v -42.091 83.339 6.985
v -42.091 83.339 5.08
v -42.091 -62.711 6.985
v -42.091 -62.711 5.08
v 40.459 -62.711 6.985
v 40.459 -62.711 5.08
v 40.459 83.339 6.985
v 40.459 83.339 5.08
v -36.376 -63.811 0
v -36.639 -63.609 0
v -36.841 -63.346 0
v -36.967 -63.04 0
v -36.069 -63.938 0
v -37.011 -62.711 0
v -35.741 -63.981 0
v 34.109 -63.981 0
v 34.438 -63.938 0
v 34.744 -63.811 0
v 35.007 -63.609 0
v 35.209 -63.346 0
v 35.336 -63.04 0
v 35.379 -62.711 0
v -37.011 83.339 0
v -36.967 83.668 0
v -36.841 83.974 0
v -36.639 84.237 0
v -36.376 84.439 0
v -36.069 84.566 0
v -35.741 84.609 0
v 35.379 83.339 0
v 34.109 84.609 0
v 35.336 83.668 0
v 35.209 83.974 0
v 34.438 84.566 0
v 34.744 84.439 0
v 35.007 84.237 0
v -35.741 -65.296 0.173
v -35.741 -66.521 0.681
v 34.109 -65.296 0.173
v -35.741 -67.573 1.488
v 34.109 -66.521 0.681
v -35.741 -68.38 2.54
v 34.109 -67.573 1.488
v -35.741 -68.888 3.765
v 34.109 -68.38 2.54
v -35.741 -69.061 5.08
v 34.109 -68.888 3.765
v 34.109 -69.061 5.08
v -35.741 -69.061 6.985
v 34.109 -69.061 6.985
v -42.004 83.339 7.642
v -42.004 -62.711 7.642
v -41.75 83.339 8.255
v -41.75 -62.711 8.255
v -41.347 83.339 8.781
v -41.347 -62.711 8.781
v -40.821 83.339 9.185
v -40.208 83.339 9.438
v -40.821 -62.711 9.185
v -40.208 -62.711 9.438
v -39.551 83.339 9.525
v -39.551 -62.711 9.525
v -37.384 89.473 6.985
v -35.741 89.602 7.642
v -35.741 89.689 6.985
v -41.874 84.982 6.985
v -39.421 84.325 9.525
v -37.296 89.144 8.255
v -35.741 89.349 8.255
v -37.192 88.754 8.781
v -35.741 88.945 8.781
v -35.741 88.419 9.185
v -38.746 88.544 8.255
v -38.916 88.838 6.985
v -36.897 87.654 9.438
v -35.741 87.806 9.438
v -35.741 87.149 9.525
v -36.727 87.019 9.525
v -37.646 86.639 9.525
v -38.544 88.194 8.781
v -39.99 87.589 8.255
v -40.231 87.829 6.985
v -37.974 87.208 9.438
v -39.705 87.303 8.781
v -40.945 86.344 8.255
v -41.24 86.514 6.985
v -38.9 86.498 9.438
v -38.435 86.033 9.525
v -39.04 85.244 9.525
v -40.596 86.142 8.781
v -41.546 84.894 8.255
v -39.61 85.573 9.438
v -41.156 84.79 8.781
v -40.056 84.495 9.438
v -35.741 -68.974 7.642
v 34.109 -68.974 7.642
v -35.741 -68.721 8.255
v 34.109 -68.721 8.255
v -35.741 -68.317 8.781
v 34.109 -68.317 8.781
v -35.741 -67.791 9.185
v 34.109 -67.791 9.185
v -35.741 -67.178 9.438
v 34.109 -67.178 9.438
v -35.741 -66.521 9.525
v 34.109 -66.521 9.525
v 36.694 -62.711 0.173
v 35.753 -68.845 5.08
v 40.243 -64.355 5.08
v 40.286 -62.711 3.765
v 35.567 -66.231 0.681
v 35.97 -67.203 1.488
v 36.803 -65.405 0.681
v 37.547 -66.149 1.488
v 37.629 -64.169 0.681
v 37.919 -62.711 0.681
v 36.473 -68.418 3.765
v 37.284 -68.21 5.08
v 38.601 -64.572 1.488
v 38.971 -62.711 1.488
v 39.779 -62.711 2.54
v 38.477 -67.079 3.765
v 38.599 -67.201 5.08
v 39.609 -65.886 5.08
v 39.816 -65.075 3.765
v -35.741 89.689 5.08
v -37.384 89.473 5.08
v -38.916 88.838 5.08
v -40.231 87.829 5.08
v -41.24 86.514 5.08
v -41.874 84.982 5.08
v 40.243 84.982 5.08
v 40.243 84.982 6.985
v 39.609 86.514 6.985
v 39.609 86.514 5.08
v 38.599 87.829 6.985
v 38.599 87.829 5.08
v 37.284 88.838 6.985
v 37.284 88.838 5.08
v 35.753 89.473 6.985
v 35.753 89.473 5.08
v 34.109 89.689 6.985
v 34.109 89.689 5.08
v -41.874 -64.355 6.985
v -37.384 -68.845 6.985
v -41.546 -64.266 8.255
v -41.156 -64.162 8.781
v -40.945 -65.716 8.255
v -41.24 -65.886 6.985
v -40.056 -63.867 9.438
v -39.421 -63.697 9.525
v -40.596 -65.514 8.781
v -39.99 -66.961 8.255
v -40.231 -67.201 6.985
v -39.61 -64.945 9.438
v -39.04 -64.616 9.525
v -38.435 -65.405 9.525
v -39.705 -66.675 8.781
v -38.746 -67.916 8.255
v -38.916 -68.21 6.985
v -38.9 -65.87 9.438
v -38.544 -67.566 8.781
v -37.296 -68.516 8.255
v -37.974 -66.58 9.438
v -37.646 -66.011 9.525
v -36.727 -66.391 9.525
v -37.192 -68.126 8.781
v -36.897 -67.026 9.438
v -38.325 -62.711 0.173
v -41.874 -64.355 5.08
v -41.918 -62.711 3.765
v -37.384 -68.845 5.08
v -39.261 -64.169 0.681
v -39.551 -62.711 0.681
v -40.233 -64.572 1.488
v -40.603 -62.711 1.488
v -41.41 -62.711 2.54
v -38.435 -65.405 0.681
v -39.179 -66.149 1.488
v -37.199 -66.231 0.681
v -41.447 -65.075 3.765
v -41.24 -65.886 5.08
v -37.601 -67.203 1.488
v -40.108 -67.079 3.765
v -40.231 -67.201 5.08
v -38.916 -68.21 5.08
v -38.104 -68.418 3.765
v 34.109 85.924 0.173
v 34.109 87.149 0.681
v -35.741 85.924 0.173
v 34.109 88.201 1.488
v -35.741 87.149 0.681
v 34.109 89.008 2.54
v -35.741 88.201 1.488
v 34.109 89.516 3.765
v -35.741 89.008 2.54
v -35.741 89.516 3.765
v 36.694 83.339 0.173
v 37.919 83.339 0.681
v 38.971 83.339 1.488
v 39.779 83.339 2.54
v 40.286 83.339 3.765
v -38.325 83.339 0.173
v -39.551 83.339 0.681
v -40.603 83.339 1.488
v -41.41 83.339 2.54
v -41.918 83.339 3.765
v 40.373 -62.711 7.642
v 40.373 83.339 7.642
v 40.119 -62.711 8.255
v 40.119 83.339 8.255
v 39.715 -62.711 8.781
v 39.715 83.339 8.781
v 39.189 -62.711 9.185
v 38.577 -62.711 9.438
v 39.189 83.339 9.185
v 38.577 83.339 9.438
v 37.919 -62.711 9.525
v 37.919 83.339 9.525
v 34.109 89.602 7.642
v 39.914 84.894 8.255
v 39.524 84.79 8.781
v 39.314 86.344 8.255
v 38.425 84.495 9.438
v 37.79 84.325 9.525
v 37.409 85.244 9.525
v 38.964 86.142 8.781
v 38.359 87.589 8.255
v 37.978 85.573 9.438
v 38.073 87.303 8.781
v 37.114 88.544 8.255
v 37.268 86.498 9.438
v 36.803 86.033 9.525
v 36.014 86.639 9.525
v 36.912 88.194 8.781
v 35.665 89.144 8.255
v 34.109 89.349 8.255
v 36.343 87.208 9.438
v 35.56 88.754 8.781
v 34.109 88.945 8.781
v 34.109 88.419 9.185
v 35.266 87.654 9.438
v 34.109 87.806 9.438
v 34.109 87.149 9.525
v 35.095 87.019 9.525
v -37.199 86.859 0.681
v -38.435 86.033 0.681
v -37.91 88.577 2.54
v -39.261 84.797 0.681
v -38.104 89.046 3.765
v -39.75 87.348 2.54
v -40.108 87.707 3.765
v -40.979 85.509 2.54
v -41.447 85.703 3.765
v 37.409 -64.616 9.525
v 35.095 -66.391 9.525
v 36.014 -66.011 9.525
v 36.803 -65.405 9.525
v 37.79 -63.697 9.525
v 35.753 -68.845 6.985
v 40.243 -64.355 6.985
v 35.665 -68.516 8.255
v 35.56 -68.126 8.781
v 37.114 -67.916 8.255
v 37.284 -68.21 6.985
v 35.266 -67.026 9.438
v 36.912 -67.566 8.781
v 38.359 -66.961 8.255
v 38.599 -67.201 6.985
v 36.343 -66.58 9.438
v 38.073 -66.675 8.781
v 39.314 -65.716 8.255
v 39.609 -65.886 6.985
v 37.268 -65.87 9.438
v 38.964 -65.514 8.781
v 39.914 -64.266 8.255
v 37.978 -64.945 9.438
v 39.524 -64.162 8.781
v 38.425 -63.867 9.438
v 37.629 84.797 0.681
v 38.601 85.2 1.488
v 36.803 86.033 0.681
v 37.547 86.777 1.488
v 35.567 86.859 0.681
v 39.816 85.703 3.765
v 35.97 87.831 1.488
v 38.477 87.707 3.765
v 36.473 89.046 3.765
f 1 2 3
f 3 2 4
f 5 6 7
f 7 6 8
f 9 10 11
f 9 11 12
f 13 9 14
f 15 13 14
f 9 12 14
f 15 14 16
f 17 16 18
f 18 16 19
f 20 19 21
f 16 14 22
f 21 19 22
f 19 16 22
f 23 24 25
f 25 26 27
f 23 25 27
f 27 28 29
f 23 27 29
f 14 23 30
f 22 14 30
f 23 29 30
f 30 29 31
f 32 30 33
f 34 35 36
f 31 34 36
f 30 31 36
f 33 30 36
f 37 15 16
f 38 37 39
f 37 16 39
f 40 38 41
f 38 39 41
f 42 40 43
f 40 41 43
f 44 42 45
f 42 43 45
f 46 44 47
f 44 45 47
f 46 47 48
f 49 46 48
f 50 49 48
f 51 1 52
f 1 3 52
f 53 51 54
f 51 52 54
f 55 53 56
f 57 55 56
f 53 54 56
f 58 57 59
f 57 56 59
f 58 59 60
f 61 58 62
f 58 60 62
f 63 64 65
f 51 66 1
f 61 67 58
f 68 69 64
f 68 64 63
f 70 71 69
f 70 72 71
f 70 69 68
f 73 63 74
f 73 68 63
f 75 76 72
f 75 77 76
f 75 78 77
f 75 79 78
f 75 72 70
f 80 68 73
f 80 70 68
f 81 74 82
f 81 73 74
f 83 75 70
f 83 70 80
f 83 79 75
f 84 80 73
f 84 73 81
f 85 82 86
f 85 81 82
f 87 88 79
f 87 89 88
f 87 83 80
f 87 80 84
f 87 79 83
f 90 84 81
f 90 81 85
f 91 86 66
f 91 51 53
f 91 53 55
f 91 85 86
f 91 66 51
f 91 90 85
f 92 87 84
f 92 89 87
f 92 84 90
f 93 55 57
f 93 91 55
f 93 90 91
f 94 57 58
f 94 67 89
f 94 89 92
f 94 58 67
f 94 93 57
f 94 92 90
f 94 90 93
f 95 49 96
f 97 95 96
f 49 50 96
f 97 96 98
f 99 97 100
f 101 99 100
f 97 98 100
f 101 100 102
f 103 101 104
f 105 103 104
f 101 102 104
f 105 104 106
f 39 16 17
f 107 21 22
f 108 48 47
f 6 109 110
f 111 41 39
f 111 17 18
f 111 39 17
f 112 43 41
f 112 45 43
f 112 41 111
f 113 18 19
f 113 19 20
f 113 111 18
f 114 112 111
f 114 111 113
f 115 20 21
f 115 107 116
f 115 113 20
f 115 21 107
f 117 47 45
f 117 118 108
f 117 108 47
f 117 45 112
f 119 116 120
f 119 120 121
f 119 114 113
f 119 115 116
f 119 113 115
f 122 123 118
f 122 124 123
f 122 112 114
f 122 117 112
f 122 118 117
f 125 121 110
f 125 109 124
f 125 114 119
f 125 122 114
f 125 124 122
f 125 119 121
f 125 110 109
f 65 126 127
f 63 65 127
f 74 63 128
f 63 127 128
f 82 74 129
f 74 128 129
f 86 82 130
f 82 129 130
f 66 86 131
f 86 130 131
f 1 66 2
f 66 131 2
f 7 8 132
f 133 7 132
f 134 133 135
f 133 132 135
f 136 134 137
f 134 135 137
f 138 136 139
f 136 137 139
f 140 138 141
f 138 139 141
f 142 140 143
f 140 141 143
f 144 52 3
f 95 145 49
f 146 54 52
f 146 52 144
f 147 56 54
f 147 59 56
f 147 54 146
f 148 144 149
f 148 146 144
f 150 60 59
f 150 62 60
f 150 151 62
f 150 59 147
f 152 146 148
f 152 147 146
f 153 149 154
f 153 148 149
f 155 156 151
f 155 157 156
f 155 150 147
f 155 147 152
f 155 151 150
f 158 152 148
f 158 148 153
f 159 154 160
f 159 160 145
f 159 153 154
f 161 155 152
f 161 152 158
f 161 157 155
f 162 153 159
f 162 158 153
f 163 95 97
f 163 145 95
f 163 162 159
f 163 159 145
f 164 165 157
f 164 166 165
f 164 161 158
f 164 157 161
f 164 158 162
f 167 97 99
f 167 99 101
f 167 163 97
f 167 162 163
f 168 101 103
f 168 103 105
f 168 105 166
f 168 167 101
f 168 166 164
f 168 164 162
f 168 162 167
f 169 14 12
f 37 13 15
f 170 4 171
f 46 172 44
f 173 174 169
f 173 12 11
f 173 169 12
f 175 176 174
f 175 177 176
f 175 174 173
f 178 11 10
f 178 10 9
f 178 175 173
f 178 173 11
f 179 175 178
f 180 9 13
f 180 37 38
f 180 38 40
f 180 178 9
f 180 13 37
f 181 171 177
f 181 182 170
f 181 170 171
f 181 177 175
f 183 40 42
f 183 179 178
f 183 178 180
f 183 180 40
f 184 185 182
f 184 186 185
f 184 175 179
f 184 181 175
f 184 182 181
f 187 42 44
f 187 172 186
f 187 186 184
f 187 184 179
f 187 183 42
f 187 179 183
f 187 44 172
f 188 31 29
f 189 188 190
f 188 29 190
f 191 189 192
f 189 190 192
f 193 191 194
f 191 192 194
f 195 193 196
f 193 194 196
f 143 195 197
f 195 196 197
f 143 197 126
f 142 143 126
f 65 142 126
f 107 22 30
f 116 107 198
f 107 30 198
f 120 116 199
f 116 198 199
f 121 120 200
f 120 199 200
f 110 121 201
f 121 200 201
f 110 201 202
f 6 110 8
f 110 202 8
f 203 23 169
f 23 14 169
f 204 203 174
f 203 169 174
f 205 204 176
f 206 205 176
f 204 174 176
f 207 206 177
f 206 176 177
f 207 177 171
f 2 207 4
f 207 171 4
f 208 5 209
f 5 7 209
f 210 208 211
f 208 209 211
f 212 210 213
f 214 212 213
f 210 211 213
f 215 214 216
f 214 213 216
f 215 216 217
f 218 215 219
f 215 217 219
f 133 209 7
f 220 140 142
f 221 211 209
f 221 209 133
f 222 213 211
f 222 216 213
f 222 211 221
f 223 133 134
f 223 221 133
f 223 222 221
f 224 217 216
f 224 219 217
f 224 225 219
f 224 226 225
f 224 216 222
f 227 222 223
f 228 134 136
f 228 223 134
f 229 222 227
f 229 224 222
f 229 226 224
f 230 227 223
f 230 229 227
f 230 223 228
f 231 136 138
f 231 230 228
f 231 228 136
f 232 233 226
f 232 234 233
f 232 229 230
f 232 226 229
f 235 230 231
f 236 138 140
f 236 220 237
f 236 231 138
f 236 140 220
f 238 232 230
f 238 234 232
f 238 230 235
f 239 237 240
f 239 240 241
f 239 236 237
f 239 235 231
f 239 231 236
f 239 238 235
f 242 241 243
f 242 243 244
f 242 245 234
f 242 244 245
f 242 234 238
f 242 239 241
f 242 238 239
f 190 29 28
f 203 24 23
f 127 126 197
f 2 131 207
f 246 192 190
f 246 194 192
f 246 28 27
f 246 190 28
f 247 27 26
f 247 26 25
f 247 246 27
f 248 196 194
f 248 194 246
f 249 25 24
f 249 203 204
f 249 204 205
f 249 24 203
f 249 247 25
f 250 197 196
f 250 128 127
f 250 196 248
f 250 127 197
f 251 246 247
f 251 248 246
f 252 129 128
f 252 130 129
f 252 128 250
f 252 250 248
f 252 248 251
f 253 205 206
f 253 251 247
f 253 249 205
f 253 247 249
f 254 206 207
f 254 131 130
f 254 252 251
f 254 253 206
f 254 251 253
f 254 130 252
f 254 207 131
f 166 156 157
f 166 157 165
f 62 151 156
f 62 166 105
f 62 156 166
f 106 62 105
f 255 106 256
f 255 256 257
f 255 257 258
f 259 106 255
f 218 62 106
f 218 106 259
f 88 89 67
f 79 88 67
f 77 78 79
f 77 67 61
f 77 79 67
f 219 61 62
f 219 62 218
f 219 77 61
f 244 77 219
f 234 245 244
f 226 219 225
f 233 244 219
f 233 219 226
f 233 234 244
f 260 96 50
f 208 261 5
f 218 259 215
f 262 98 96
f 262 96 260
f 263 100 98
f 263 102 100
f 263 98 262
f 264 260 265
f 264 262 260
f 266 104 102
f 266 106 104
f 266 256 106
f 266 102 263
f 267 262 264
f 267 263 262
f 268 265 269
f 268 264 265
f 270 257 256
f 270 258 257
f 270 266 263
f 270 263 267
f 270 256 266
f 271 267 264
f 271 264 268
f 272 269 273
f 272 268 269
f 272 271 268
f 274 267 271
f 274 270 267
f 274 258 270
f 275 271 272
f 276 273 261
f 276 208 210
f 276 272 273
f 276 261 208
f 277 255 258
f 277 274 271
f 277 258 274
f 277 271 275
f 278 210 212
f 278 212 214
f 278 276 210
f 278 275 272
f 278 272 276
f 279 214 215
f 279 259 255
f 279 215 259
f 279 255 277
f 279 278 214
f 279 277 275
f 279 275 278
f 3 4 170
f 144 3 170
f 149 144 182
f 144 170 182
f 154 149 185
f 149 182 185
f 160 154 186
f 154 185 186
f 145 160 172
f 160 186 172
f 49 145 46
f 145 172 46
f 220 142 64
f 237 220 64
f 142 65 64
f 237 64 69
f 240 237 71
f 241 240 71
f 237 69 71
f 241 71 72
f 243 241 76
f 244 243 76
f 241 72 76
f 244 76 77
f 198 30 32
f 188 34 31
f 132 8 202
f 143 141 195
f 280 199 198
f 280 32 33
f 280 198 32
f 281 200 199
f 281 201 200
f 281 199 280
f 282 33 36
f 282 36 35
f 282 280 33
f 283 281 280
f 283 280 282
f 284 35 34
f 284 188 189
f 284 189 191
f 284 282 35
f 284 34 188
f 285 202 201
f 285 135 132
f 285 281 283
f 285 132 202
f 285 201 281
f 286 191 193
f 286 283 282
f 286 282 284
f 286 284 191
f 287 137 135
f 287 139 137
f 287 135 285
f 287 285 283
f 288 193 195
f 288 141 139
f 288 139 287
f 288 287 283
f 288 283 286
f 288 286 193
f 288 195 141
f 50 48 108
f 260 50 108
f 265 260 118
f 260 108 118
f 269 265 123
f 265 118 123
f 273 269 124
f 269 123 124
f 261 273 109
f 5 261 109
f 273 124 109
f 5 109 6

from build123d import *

# Parameters (mm, degrees)
F1_DEPTH = 9.525
F2_R     = 2.54
F3_R     = 5.08


with BuildPart() as f1:
    # F0 (on Top) → F1 (new body)
    with BuildSketch(Plane.XY):
        with BuildLine():
            Line((34.109328, 89.688999), (-35.740672, 89.688999))
            ThreePointArc((-35.740672, 89.688999), (-40.2308, 87.829127), (-42.090672, 83.338999))
            Line((-42.090672, 83.338999), (-42.090672, -62.711001))
            ThreePointArc((-42.090672, -62.711001), (-40.2308, -67.201129), (-35.740672, -69.061001))
            Line((-35.740672, -69.061001), (34.109328, -69.061001))
            ThreePointArc((34.109328, -69.061001), (38.599456, -67.201129), (40.459328, -62.711001))
            Line((40.459328, -62.711001), (40.459328, 83.338999))
            ThreePointArc((40.459328, 83.338999), (38.599456, 87.829127), (34.109328, 89.688999))
        make_face()
    extrude(amount=F1_DEPTH)

    # F2
    f2_edges = [f1.edges().sort_by_distance(p)[0] for p in [
        (-42.090672, 10.313999, 9.525),
        (-40.2308, -67.201129, 9.525),
        (-0.815672, -69.061001, 9.525),
        (38.599456, -67.201129, 9.525),
        (40.459328, 10.313999, 9.525),
        (38.599456, 87.829127, 9.525),
        (-0.815672, 89.688999, 9.525),
        (-40.2308, 87.829127, 9.525),
    ]]
    fillet(f2_edges, radius=F2_R)

    # F3
    f3_edges = [f1.edges().sort_by_distance(p)[0] for p in [
        (-42.090672, 10.313999, 0),
        (-40.2308, -67.201129, 0),
        (-0.815672, -69.061001, 0),
        (38.599456, -67.201129, 0),
        (40.459328, 10.313999, 0),
        (38.599456, 87.829127, 0),
        (-0.815672, 89.688999, 0),
        (-40.2308, 87.829127, 0),
    ]]
    fillet(f3_edges, radius=F3_R)


solid = f1.part
